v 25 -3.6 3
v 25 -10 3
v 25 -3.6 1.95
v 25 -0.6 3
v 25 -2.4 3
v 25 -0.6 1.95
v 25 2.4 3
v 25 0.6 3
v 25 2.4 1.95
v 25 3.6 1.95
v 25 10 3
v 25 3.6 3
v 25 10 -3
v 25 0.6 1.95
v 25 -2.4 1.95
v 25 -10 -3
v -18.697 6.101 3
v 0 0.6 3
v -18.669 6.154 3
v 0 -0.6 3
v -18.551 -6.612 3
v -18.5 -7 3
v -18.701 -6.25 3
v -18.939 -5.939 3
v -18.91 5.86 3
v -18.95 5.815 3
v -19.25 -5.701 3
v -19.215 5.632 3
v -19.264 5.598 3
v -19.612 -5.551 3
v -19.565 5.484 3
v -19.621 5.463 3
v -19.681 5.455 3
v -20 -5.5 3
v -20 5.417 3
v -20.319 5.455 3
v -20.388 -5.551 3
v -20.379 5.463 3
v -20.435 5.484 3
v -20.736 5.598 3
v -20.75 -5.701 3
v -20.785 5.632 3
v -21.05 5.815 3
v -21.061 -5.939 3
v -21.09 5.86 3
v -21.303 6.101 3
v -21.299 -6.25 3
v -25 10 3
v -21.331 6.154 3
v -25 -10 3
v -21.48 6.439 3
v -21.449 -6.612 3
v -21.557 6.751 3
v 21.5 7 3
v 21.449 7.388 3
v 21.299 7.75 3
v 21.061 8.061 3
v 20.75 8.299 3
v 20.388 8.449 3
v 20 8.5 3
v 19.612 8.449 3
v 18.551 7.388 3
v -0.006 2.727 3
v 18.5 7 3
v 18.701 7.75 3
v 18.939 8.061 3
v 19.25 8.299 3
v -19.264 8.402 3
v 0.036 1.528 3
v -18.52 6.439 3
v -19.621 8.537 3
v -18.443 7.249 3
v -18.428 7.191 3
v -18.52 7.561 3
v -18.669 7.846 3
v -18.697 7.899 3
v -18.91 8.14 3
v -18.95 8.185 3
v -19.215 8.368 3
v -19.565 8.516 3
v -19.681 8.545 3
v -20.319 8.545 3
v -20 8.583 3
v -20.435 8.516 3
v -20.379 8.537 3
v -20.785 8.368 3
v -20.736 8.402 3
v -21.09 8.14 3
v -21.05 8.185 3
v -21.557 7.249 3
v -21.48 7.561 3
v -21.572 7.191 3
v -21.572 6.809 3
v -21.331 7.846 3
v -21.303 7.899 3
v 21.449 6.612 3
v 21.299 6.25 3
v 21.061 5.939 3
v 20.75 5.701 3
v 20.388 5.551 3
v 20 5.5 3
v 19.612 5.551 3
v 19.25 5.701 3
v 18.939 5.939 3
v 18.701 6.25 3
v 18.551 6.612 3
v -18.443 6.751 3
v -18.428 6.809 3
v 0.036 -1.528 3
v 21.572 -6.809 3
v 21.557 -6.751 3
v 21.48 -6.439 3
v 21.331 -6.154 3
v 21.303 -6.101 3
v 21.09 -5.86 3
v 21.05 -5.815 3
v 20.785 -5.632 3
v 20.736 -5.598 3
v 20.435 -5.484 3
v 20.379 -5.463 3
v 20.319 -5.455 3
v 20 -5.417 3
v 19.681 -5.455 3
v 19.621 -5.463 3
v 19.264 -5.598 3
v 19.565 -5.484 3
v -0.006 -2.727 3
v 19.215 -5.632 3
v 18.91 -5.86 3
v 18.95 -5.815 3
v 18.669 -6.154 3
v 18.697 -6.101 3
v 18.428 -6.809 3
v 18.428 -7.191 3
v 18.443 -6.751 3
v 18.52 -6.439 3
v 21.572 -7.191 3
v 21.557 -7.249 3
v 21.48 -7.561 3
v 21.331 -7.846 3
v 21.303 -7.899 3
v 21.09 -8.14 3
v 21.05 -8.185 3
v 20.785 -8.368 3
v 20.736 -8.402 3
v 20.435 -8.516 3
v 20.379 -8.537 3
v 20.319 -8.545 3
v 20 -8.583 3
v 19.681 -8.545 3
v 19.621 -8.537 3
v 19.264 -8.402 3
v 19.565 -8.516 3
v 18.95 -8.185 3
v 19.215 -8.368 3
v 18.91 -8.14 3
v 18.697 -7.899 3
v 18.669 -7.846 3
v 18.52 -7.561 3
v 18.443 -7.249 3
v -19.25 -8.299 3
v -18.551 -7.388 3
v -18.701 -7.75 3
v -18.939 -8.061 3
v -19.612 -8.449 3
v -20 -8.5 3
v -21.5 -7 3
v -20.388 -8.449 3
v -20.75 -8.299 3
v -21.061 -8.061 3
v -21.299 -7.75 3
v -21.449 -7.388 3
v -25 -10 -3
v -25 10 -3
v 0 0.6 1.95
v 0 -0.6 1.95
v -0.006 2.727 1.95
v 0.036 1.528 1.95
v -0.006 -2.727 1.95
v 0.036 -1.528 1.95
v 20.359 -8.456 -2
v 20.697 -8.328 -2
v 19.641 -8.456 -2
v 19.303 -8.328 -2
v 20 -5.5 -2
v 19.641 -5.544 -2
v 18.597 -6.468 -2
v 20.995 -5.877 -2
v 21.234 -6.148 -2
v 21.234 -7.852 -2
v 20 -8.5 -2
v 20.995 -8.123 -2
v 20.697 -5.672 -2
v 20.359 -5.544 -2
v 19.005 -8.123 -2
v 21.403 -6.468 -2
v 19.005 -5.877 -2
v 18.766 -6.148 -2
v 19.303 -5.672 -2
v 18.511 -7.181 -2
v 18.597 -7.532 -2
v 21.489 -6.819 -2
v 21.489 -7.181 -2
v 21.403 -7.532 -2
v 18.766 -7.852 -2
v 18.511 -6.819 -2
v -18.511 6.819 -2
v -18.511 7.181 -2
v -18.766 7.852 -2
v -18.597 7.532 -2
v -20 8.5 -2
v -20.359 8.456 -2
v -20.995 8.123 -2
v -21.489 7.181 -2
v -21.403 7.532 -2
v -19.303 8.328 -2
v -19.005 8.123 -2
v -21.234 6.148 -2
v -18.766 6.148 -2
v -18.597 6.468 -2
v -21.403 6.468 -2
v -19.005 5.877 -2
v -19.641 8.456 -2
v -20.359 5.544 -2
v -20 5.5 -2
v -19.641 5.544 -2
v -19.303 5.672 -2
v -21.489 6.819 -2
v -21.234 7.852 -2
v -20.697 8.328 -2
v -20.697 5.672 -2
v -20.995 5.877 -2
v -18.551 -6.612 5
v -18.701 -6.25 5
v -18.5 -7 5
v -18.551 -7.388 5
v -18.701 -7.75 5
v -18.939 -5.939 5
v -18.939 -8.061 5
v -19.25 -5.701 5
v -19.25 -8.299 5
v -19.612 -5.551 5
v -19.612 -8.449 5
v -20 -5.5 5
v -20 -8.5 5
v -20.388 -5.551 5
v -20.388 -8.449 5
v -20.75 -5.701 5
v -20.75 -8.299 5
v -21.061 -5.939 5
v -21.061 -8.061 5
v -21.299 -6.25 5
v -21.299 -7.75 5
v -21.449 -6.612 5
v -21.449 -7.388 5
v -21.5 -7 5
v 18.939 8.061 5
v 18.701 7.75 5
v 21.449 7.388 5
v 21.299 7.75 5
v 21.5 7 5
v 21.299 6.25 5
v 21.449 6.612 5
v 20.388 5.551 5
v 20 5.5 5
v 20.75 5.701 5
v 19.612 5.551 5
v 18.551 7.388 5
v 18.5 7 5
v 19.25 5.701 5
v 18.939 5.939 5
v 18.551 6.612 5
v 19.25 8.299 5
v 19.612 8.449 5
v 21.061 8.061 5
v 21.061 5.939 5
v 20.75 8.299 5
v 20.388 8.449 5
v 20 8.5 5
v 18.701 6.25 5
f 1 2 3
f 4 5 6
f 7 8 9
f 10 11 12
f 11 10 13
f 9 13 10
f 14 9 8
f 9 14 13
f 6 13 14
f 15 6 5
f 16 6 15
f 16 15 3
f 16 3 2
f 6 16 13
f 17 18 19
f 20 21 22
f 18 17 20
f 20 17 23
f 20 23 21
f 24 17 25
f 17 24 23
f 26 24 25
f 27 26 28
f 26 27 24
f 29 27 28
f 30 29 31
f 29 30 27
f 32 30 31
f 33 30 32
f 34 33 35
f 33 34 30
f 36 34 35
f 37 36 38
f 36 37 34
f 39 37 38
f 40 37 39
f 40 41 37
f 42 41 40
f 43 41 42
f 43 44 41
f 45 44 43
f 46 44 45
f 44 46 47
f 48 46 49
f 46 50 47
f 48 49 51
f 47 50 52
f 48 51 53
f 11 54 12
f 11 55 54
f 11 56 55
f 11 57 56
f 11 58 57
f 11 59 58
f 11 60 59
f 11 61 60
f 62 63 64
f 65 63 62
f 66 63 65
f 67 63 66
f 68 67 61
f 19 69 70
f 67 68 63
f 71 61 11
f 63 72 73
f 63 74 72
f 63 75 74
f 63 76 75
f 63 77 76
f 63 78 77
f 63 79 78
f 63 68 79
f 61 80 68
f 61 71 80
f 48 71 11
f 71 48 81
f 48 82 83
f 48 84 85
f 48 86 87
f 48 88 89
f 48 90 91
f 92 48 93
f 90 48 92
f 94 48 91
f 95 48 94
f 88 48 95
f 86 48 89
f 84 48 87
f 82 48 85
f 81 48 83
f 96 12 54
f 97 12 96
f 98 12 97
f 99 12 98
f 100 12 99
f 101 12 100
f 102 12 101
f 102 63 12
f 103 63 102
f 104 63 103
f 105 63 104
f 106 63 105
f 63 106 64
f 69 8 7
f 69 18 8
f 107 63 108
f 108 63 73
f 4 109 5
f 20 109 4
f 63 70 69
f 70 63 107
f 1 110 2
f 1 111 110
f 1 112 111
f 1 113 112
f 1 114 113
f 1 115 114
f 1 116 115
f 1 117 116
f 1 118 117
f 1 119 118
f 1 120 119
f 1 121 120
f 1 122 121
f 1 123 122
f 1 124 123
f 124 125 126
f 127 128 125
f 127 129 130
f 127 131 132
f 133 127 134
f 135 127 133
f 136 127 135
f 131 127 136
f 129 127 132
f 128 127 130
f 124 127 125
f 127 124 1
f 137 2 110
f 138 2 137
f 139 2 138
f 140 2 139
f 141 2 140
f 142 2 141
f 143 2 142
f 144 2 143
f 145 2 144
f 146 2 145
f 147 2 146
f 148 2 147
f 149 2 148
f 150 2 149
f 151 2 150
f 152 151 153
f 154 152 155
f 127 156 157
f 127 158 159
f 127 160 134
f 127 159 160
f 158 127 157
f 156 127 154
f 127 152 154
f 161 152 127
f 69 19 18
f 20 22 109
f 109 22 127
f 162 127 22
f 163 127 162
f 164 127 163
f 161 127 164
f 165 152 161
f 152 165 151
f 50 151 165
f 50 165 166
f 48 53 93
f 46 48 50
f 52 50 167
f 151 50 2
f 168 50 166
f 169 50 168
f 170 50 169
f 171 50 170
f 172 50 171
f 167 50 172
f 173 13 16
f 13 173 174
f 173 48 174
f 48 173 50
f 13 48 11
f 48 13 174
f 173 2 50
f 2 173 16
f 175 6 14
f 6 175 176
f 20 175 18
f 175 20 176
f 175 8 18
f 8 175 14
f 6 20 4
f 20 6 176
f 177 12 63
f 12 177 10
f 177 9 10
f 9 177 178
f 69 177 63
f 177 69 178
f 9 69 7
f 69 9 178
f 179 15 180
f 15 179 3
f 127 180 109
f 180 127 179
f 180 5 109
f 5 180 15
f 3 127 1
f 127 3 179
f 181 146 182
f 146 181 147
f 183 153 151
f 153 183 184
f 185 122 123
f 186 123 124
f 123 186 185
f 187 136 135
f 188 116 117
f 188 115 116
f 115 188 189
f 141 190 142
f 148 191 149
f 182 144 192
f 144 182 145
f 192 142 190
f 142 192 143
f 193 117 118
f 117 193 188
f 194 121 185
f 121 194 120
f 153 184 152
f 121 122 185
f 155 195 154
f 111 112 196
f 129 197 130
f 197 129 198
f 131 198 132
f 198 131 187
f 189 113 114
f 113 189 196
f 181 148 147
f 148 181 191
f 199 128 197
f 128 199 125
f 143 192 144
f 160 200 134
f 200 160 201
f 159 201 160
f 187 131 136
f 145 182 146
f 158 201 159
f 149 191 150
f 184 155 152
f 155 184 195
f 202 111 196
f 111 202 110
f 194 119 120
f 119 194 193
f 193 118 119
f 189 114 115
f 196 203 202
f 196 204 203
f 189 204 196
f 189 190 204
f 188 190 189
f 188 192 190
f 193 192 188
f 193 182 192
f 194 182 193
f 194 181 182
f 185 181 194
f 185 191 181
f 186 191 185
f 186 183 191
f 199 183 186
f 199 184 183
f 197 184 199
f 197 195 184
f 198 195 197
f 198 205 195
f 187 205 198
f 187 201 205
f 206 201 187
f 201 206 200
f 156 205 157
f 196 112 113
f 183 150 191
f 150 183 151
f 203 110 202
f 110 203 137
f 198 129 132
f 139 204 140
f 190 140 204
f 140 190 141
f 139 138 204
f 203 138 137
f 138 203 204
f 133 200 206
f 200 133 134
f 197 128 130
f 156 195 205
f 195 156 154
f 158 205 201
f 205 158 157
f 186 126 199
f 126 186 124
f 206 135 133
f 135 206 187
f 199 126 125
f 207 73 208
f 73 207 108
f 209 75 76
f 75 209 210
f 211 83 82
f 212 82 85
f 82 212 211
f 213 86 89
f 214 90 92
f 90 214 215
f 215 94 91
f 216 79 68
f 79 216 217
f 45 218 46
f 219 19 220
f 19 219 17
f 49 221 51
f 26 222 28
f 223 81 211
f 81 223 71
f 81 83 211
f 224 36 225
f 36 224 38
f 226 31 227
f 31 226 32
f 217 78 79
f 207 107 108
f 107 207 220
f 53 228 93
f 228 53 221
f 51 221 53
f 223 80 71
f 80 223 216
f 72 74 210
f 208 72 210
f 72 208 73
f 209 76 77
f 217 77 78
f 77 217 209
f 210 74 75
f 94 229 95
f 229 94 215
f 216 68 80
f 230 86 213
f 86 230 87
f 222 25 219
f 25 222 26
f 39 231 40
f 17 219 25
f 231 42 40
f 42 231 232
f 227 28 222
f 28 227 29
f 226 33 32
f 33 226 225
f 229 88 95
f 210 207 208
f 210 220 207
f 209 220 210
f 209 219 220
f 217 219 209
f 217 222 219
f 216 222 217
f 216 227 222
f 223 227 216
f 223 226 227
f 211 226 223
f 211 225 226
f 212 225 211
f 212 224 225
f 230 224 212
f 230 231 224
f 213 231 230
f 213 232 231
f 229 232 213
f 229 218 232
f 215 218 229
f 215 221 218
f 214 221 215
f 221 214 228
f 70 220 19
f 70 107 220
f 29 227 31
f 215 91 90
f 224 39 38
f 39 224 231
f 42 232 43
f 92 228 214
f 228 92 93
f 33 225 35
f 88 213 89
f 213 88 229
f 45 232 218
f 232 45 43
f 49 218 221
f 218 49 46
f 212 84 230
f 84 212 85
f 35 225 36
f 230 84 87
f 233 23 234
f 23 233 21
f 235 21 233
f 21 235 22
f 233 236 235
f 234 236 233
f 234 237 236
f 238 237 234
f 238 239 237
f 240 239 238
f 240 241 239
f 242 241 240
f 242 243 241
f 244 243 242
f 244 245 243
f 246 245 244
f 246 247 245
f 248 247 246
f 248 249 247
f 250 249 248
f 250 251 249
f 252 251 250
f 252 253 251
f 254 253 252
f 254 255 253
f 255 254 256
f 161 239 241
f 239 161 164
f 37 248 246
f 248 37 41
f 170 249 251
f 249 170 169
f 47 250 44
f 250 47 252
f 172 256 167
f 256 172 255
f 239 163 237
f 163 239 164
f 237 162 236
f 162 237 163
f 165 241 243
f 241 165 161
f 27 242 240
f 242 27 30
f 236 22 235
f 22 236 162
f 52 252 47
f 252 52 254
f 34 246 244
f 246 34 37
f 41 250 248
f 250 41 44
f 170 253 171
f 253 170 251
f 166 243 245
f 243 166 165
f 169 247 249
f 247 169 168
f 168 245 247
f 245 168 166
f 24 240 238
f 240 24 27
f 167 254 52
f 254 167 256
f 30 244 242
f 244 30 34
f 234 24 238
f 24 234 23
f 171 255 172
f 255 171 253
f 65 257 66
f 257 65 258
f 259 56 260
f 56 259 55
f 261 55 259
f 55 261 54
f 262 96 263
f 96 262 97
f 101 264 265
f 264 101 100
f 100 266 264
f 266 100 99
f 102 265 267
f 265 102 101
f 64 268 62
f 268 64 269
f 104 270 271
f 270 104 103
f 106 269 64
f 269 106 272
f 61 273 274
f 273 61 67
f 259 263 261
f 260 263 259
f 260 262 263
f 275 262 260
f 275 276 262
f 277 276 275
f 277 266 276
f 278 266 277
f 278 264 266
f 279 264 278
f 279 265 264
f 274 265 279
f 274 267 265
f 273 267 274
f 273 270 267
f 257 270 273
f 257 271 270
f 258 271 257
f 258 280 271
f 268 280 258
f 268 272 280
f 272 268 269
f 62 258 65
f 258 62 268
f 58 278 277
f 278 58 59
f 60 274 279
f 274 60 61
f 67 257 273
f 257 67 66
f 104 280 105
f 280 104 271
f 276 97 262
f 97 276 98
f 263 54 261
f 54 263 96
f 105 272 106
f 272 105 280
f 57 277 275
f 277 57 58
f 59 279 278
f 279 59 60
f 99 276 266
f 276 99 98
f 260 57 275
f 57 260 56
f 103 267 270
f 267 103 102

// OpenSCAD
$fa = 1;
$fs = 0.4;
difference() {
    cube([50,20,6],center=true);
    translate([25,0,2.5])
        rotate([0,90,0])
            cube([1.1,1.2,50], center=true);
    translate([25,3,2.5])
        rotate([-2,90,0])
            cube([1.1,1.2,50], center=true);
    translate([25,-3,2.5])
        rotate([2,90,0])
            cube([1.1,1.2,50], center=true);
    translate([20,-7,-2])
        rotate([0,0,90])
            cylinder(6,1.5,1.6);
    translate([-20,7,-2])
        rotate([0,0,90])
            cylinder(6,1.5,1.6);
    };
translate([-20,-7,-1])
    cylinder(6,1.5,1.5);
translate([20,7,-1])
    cylinder(6,1.5,1.5);
